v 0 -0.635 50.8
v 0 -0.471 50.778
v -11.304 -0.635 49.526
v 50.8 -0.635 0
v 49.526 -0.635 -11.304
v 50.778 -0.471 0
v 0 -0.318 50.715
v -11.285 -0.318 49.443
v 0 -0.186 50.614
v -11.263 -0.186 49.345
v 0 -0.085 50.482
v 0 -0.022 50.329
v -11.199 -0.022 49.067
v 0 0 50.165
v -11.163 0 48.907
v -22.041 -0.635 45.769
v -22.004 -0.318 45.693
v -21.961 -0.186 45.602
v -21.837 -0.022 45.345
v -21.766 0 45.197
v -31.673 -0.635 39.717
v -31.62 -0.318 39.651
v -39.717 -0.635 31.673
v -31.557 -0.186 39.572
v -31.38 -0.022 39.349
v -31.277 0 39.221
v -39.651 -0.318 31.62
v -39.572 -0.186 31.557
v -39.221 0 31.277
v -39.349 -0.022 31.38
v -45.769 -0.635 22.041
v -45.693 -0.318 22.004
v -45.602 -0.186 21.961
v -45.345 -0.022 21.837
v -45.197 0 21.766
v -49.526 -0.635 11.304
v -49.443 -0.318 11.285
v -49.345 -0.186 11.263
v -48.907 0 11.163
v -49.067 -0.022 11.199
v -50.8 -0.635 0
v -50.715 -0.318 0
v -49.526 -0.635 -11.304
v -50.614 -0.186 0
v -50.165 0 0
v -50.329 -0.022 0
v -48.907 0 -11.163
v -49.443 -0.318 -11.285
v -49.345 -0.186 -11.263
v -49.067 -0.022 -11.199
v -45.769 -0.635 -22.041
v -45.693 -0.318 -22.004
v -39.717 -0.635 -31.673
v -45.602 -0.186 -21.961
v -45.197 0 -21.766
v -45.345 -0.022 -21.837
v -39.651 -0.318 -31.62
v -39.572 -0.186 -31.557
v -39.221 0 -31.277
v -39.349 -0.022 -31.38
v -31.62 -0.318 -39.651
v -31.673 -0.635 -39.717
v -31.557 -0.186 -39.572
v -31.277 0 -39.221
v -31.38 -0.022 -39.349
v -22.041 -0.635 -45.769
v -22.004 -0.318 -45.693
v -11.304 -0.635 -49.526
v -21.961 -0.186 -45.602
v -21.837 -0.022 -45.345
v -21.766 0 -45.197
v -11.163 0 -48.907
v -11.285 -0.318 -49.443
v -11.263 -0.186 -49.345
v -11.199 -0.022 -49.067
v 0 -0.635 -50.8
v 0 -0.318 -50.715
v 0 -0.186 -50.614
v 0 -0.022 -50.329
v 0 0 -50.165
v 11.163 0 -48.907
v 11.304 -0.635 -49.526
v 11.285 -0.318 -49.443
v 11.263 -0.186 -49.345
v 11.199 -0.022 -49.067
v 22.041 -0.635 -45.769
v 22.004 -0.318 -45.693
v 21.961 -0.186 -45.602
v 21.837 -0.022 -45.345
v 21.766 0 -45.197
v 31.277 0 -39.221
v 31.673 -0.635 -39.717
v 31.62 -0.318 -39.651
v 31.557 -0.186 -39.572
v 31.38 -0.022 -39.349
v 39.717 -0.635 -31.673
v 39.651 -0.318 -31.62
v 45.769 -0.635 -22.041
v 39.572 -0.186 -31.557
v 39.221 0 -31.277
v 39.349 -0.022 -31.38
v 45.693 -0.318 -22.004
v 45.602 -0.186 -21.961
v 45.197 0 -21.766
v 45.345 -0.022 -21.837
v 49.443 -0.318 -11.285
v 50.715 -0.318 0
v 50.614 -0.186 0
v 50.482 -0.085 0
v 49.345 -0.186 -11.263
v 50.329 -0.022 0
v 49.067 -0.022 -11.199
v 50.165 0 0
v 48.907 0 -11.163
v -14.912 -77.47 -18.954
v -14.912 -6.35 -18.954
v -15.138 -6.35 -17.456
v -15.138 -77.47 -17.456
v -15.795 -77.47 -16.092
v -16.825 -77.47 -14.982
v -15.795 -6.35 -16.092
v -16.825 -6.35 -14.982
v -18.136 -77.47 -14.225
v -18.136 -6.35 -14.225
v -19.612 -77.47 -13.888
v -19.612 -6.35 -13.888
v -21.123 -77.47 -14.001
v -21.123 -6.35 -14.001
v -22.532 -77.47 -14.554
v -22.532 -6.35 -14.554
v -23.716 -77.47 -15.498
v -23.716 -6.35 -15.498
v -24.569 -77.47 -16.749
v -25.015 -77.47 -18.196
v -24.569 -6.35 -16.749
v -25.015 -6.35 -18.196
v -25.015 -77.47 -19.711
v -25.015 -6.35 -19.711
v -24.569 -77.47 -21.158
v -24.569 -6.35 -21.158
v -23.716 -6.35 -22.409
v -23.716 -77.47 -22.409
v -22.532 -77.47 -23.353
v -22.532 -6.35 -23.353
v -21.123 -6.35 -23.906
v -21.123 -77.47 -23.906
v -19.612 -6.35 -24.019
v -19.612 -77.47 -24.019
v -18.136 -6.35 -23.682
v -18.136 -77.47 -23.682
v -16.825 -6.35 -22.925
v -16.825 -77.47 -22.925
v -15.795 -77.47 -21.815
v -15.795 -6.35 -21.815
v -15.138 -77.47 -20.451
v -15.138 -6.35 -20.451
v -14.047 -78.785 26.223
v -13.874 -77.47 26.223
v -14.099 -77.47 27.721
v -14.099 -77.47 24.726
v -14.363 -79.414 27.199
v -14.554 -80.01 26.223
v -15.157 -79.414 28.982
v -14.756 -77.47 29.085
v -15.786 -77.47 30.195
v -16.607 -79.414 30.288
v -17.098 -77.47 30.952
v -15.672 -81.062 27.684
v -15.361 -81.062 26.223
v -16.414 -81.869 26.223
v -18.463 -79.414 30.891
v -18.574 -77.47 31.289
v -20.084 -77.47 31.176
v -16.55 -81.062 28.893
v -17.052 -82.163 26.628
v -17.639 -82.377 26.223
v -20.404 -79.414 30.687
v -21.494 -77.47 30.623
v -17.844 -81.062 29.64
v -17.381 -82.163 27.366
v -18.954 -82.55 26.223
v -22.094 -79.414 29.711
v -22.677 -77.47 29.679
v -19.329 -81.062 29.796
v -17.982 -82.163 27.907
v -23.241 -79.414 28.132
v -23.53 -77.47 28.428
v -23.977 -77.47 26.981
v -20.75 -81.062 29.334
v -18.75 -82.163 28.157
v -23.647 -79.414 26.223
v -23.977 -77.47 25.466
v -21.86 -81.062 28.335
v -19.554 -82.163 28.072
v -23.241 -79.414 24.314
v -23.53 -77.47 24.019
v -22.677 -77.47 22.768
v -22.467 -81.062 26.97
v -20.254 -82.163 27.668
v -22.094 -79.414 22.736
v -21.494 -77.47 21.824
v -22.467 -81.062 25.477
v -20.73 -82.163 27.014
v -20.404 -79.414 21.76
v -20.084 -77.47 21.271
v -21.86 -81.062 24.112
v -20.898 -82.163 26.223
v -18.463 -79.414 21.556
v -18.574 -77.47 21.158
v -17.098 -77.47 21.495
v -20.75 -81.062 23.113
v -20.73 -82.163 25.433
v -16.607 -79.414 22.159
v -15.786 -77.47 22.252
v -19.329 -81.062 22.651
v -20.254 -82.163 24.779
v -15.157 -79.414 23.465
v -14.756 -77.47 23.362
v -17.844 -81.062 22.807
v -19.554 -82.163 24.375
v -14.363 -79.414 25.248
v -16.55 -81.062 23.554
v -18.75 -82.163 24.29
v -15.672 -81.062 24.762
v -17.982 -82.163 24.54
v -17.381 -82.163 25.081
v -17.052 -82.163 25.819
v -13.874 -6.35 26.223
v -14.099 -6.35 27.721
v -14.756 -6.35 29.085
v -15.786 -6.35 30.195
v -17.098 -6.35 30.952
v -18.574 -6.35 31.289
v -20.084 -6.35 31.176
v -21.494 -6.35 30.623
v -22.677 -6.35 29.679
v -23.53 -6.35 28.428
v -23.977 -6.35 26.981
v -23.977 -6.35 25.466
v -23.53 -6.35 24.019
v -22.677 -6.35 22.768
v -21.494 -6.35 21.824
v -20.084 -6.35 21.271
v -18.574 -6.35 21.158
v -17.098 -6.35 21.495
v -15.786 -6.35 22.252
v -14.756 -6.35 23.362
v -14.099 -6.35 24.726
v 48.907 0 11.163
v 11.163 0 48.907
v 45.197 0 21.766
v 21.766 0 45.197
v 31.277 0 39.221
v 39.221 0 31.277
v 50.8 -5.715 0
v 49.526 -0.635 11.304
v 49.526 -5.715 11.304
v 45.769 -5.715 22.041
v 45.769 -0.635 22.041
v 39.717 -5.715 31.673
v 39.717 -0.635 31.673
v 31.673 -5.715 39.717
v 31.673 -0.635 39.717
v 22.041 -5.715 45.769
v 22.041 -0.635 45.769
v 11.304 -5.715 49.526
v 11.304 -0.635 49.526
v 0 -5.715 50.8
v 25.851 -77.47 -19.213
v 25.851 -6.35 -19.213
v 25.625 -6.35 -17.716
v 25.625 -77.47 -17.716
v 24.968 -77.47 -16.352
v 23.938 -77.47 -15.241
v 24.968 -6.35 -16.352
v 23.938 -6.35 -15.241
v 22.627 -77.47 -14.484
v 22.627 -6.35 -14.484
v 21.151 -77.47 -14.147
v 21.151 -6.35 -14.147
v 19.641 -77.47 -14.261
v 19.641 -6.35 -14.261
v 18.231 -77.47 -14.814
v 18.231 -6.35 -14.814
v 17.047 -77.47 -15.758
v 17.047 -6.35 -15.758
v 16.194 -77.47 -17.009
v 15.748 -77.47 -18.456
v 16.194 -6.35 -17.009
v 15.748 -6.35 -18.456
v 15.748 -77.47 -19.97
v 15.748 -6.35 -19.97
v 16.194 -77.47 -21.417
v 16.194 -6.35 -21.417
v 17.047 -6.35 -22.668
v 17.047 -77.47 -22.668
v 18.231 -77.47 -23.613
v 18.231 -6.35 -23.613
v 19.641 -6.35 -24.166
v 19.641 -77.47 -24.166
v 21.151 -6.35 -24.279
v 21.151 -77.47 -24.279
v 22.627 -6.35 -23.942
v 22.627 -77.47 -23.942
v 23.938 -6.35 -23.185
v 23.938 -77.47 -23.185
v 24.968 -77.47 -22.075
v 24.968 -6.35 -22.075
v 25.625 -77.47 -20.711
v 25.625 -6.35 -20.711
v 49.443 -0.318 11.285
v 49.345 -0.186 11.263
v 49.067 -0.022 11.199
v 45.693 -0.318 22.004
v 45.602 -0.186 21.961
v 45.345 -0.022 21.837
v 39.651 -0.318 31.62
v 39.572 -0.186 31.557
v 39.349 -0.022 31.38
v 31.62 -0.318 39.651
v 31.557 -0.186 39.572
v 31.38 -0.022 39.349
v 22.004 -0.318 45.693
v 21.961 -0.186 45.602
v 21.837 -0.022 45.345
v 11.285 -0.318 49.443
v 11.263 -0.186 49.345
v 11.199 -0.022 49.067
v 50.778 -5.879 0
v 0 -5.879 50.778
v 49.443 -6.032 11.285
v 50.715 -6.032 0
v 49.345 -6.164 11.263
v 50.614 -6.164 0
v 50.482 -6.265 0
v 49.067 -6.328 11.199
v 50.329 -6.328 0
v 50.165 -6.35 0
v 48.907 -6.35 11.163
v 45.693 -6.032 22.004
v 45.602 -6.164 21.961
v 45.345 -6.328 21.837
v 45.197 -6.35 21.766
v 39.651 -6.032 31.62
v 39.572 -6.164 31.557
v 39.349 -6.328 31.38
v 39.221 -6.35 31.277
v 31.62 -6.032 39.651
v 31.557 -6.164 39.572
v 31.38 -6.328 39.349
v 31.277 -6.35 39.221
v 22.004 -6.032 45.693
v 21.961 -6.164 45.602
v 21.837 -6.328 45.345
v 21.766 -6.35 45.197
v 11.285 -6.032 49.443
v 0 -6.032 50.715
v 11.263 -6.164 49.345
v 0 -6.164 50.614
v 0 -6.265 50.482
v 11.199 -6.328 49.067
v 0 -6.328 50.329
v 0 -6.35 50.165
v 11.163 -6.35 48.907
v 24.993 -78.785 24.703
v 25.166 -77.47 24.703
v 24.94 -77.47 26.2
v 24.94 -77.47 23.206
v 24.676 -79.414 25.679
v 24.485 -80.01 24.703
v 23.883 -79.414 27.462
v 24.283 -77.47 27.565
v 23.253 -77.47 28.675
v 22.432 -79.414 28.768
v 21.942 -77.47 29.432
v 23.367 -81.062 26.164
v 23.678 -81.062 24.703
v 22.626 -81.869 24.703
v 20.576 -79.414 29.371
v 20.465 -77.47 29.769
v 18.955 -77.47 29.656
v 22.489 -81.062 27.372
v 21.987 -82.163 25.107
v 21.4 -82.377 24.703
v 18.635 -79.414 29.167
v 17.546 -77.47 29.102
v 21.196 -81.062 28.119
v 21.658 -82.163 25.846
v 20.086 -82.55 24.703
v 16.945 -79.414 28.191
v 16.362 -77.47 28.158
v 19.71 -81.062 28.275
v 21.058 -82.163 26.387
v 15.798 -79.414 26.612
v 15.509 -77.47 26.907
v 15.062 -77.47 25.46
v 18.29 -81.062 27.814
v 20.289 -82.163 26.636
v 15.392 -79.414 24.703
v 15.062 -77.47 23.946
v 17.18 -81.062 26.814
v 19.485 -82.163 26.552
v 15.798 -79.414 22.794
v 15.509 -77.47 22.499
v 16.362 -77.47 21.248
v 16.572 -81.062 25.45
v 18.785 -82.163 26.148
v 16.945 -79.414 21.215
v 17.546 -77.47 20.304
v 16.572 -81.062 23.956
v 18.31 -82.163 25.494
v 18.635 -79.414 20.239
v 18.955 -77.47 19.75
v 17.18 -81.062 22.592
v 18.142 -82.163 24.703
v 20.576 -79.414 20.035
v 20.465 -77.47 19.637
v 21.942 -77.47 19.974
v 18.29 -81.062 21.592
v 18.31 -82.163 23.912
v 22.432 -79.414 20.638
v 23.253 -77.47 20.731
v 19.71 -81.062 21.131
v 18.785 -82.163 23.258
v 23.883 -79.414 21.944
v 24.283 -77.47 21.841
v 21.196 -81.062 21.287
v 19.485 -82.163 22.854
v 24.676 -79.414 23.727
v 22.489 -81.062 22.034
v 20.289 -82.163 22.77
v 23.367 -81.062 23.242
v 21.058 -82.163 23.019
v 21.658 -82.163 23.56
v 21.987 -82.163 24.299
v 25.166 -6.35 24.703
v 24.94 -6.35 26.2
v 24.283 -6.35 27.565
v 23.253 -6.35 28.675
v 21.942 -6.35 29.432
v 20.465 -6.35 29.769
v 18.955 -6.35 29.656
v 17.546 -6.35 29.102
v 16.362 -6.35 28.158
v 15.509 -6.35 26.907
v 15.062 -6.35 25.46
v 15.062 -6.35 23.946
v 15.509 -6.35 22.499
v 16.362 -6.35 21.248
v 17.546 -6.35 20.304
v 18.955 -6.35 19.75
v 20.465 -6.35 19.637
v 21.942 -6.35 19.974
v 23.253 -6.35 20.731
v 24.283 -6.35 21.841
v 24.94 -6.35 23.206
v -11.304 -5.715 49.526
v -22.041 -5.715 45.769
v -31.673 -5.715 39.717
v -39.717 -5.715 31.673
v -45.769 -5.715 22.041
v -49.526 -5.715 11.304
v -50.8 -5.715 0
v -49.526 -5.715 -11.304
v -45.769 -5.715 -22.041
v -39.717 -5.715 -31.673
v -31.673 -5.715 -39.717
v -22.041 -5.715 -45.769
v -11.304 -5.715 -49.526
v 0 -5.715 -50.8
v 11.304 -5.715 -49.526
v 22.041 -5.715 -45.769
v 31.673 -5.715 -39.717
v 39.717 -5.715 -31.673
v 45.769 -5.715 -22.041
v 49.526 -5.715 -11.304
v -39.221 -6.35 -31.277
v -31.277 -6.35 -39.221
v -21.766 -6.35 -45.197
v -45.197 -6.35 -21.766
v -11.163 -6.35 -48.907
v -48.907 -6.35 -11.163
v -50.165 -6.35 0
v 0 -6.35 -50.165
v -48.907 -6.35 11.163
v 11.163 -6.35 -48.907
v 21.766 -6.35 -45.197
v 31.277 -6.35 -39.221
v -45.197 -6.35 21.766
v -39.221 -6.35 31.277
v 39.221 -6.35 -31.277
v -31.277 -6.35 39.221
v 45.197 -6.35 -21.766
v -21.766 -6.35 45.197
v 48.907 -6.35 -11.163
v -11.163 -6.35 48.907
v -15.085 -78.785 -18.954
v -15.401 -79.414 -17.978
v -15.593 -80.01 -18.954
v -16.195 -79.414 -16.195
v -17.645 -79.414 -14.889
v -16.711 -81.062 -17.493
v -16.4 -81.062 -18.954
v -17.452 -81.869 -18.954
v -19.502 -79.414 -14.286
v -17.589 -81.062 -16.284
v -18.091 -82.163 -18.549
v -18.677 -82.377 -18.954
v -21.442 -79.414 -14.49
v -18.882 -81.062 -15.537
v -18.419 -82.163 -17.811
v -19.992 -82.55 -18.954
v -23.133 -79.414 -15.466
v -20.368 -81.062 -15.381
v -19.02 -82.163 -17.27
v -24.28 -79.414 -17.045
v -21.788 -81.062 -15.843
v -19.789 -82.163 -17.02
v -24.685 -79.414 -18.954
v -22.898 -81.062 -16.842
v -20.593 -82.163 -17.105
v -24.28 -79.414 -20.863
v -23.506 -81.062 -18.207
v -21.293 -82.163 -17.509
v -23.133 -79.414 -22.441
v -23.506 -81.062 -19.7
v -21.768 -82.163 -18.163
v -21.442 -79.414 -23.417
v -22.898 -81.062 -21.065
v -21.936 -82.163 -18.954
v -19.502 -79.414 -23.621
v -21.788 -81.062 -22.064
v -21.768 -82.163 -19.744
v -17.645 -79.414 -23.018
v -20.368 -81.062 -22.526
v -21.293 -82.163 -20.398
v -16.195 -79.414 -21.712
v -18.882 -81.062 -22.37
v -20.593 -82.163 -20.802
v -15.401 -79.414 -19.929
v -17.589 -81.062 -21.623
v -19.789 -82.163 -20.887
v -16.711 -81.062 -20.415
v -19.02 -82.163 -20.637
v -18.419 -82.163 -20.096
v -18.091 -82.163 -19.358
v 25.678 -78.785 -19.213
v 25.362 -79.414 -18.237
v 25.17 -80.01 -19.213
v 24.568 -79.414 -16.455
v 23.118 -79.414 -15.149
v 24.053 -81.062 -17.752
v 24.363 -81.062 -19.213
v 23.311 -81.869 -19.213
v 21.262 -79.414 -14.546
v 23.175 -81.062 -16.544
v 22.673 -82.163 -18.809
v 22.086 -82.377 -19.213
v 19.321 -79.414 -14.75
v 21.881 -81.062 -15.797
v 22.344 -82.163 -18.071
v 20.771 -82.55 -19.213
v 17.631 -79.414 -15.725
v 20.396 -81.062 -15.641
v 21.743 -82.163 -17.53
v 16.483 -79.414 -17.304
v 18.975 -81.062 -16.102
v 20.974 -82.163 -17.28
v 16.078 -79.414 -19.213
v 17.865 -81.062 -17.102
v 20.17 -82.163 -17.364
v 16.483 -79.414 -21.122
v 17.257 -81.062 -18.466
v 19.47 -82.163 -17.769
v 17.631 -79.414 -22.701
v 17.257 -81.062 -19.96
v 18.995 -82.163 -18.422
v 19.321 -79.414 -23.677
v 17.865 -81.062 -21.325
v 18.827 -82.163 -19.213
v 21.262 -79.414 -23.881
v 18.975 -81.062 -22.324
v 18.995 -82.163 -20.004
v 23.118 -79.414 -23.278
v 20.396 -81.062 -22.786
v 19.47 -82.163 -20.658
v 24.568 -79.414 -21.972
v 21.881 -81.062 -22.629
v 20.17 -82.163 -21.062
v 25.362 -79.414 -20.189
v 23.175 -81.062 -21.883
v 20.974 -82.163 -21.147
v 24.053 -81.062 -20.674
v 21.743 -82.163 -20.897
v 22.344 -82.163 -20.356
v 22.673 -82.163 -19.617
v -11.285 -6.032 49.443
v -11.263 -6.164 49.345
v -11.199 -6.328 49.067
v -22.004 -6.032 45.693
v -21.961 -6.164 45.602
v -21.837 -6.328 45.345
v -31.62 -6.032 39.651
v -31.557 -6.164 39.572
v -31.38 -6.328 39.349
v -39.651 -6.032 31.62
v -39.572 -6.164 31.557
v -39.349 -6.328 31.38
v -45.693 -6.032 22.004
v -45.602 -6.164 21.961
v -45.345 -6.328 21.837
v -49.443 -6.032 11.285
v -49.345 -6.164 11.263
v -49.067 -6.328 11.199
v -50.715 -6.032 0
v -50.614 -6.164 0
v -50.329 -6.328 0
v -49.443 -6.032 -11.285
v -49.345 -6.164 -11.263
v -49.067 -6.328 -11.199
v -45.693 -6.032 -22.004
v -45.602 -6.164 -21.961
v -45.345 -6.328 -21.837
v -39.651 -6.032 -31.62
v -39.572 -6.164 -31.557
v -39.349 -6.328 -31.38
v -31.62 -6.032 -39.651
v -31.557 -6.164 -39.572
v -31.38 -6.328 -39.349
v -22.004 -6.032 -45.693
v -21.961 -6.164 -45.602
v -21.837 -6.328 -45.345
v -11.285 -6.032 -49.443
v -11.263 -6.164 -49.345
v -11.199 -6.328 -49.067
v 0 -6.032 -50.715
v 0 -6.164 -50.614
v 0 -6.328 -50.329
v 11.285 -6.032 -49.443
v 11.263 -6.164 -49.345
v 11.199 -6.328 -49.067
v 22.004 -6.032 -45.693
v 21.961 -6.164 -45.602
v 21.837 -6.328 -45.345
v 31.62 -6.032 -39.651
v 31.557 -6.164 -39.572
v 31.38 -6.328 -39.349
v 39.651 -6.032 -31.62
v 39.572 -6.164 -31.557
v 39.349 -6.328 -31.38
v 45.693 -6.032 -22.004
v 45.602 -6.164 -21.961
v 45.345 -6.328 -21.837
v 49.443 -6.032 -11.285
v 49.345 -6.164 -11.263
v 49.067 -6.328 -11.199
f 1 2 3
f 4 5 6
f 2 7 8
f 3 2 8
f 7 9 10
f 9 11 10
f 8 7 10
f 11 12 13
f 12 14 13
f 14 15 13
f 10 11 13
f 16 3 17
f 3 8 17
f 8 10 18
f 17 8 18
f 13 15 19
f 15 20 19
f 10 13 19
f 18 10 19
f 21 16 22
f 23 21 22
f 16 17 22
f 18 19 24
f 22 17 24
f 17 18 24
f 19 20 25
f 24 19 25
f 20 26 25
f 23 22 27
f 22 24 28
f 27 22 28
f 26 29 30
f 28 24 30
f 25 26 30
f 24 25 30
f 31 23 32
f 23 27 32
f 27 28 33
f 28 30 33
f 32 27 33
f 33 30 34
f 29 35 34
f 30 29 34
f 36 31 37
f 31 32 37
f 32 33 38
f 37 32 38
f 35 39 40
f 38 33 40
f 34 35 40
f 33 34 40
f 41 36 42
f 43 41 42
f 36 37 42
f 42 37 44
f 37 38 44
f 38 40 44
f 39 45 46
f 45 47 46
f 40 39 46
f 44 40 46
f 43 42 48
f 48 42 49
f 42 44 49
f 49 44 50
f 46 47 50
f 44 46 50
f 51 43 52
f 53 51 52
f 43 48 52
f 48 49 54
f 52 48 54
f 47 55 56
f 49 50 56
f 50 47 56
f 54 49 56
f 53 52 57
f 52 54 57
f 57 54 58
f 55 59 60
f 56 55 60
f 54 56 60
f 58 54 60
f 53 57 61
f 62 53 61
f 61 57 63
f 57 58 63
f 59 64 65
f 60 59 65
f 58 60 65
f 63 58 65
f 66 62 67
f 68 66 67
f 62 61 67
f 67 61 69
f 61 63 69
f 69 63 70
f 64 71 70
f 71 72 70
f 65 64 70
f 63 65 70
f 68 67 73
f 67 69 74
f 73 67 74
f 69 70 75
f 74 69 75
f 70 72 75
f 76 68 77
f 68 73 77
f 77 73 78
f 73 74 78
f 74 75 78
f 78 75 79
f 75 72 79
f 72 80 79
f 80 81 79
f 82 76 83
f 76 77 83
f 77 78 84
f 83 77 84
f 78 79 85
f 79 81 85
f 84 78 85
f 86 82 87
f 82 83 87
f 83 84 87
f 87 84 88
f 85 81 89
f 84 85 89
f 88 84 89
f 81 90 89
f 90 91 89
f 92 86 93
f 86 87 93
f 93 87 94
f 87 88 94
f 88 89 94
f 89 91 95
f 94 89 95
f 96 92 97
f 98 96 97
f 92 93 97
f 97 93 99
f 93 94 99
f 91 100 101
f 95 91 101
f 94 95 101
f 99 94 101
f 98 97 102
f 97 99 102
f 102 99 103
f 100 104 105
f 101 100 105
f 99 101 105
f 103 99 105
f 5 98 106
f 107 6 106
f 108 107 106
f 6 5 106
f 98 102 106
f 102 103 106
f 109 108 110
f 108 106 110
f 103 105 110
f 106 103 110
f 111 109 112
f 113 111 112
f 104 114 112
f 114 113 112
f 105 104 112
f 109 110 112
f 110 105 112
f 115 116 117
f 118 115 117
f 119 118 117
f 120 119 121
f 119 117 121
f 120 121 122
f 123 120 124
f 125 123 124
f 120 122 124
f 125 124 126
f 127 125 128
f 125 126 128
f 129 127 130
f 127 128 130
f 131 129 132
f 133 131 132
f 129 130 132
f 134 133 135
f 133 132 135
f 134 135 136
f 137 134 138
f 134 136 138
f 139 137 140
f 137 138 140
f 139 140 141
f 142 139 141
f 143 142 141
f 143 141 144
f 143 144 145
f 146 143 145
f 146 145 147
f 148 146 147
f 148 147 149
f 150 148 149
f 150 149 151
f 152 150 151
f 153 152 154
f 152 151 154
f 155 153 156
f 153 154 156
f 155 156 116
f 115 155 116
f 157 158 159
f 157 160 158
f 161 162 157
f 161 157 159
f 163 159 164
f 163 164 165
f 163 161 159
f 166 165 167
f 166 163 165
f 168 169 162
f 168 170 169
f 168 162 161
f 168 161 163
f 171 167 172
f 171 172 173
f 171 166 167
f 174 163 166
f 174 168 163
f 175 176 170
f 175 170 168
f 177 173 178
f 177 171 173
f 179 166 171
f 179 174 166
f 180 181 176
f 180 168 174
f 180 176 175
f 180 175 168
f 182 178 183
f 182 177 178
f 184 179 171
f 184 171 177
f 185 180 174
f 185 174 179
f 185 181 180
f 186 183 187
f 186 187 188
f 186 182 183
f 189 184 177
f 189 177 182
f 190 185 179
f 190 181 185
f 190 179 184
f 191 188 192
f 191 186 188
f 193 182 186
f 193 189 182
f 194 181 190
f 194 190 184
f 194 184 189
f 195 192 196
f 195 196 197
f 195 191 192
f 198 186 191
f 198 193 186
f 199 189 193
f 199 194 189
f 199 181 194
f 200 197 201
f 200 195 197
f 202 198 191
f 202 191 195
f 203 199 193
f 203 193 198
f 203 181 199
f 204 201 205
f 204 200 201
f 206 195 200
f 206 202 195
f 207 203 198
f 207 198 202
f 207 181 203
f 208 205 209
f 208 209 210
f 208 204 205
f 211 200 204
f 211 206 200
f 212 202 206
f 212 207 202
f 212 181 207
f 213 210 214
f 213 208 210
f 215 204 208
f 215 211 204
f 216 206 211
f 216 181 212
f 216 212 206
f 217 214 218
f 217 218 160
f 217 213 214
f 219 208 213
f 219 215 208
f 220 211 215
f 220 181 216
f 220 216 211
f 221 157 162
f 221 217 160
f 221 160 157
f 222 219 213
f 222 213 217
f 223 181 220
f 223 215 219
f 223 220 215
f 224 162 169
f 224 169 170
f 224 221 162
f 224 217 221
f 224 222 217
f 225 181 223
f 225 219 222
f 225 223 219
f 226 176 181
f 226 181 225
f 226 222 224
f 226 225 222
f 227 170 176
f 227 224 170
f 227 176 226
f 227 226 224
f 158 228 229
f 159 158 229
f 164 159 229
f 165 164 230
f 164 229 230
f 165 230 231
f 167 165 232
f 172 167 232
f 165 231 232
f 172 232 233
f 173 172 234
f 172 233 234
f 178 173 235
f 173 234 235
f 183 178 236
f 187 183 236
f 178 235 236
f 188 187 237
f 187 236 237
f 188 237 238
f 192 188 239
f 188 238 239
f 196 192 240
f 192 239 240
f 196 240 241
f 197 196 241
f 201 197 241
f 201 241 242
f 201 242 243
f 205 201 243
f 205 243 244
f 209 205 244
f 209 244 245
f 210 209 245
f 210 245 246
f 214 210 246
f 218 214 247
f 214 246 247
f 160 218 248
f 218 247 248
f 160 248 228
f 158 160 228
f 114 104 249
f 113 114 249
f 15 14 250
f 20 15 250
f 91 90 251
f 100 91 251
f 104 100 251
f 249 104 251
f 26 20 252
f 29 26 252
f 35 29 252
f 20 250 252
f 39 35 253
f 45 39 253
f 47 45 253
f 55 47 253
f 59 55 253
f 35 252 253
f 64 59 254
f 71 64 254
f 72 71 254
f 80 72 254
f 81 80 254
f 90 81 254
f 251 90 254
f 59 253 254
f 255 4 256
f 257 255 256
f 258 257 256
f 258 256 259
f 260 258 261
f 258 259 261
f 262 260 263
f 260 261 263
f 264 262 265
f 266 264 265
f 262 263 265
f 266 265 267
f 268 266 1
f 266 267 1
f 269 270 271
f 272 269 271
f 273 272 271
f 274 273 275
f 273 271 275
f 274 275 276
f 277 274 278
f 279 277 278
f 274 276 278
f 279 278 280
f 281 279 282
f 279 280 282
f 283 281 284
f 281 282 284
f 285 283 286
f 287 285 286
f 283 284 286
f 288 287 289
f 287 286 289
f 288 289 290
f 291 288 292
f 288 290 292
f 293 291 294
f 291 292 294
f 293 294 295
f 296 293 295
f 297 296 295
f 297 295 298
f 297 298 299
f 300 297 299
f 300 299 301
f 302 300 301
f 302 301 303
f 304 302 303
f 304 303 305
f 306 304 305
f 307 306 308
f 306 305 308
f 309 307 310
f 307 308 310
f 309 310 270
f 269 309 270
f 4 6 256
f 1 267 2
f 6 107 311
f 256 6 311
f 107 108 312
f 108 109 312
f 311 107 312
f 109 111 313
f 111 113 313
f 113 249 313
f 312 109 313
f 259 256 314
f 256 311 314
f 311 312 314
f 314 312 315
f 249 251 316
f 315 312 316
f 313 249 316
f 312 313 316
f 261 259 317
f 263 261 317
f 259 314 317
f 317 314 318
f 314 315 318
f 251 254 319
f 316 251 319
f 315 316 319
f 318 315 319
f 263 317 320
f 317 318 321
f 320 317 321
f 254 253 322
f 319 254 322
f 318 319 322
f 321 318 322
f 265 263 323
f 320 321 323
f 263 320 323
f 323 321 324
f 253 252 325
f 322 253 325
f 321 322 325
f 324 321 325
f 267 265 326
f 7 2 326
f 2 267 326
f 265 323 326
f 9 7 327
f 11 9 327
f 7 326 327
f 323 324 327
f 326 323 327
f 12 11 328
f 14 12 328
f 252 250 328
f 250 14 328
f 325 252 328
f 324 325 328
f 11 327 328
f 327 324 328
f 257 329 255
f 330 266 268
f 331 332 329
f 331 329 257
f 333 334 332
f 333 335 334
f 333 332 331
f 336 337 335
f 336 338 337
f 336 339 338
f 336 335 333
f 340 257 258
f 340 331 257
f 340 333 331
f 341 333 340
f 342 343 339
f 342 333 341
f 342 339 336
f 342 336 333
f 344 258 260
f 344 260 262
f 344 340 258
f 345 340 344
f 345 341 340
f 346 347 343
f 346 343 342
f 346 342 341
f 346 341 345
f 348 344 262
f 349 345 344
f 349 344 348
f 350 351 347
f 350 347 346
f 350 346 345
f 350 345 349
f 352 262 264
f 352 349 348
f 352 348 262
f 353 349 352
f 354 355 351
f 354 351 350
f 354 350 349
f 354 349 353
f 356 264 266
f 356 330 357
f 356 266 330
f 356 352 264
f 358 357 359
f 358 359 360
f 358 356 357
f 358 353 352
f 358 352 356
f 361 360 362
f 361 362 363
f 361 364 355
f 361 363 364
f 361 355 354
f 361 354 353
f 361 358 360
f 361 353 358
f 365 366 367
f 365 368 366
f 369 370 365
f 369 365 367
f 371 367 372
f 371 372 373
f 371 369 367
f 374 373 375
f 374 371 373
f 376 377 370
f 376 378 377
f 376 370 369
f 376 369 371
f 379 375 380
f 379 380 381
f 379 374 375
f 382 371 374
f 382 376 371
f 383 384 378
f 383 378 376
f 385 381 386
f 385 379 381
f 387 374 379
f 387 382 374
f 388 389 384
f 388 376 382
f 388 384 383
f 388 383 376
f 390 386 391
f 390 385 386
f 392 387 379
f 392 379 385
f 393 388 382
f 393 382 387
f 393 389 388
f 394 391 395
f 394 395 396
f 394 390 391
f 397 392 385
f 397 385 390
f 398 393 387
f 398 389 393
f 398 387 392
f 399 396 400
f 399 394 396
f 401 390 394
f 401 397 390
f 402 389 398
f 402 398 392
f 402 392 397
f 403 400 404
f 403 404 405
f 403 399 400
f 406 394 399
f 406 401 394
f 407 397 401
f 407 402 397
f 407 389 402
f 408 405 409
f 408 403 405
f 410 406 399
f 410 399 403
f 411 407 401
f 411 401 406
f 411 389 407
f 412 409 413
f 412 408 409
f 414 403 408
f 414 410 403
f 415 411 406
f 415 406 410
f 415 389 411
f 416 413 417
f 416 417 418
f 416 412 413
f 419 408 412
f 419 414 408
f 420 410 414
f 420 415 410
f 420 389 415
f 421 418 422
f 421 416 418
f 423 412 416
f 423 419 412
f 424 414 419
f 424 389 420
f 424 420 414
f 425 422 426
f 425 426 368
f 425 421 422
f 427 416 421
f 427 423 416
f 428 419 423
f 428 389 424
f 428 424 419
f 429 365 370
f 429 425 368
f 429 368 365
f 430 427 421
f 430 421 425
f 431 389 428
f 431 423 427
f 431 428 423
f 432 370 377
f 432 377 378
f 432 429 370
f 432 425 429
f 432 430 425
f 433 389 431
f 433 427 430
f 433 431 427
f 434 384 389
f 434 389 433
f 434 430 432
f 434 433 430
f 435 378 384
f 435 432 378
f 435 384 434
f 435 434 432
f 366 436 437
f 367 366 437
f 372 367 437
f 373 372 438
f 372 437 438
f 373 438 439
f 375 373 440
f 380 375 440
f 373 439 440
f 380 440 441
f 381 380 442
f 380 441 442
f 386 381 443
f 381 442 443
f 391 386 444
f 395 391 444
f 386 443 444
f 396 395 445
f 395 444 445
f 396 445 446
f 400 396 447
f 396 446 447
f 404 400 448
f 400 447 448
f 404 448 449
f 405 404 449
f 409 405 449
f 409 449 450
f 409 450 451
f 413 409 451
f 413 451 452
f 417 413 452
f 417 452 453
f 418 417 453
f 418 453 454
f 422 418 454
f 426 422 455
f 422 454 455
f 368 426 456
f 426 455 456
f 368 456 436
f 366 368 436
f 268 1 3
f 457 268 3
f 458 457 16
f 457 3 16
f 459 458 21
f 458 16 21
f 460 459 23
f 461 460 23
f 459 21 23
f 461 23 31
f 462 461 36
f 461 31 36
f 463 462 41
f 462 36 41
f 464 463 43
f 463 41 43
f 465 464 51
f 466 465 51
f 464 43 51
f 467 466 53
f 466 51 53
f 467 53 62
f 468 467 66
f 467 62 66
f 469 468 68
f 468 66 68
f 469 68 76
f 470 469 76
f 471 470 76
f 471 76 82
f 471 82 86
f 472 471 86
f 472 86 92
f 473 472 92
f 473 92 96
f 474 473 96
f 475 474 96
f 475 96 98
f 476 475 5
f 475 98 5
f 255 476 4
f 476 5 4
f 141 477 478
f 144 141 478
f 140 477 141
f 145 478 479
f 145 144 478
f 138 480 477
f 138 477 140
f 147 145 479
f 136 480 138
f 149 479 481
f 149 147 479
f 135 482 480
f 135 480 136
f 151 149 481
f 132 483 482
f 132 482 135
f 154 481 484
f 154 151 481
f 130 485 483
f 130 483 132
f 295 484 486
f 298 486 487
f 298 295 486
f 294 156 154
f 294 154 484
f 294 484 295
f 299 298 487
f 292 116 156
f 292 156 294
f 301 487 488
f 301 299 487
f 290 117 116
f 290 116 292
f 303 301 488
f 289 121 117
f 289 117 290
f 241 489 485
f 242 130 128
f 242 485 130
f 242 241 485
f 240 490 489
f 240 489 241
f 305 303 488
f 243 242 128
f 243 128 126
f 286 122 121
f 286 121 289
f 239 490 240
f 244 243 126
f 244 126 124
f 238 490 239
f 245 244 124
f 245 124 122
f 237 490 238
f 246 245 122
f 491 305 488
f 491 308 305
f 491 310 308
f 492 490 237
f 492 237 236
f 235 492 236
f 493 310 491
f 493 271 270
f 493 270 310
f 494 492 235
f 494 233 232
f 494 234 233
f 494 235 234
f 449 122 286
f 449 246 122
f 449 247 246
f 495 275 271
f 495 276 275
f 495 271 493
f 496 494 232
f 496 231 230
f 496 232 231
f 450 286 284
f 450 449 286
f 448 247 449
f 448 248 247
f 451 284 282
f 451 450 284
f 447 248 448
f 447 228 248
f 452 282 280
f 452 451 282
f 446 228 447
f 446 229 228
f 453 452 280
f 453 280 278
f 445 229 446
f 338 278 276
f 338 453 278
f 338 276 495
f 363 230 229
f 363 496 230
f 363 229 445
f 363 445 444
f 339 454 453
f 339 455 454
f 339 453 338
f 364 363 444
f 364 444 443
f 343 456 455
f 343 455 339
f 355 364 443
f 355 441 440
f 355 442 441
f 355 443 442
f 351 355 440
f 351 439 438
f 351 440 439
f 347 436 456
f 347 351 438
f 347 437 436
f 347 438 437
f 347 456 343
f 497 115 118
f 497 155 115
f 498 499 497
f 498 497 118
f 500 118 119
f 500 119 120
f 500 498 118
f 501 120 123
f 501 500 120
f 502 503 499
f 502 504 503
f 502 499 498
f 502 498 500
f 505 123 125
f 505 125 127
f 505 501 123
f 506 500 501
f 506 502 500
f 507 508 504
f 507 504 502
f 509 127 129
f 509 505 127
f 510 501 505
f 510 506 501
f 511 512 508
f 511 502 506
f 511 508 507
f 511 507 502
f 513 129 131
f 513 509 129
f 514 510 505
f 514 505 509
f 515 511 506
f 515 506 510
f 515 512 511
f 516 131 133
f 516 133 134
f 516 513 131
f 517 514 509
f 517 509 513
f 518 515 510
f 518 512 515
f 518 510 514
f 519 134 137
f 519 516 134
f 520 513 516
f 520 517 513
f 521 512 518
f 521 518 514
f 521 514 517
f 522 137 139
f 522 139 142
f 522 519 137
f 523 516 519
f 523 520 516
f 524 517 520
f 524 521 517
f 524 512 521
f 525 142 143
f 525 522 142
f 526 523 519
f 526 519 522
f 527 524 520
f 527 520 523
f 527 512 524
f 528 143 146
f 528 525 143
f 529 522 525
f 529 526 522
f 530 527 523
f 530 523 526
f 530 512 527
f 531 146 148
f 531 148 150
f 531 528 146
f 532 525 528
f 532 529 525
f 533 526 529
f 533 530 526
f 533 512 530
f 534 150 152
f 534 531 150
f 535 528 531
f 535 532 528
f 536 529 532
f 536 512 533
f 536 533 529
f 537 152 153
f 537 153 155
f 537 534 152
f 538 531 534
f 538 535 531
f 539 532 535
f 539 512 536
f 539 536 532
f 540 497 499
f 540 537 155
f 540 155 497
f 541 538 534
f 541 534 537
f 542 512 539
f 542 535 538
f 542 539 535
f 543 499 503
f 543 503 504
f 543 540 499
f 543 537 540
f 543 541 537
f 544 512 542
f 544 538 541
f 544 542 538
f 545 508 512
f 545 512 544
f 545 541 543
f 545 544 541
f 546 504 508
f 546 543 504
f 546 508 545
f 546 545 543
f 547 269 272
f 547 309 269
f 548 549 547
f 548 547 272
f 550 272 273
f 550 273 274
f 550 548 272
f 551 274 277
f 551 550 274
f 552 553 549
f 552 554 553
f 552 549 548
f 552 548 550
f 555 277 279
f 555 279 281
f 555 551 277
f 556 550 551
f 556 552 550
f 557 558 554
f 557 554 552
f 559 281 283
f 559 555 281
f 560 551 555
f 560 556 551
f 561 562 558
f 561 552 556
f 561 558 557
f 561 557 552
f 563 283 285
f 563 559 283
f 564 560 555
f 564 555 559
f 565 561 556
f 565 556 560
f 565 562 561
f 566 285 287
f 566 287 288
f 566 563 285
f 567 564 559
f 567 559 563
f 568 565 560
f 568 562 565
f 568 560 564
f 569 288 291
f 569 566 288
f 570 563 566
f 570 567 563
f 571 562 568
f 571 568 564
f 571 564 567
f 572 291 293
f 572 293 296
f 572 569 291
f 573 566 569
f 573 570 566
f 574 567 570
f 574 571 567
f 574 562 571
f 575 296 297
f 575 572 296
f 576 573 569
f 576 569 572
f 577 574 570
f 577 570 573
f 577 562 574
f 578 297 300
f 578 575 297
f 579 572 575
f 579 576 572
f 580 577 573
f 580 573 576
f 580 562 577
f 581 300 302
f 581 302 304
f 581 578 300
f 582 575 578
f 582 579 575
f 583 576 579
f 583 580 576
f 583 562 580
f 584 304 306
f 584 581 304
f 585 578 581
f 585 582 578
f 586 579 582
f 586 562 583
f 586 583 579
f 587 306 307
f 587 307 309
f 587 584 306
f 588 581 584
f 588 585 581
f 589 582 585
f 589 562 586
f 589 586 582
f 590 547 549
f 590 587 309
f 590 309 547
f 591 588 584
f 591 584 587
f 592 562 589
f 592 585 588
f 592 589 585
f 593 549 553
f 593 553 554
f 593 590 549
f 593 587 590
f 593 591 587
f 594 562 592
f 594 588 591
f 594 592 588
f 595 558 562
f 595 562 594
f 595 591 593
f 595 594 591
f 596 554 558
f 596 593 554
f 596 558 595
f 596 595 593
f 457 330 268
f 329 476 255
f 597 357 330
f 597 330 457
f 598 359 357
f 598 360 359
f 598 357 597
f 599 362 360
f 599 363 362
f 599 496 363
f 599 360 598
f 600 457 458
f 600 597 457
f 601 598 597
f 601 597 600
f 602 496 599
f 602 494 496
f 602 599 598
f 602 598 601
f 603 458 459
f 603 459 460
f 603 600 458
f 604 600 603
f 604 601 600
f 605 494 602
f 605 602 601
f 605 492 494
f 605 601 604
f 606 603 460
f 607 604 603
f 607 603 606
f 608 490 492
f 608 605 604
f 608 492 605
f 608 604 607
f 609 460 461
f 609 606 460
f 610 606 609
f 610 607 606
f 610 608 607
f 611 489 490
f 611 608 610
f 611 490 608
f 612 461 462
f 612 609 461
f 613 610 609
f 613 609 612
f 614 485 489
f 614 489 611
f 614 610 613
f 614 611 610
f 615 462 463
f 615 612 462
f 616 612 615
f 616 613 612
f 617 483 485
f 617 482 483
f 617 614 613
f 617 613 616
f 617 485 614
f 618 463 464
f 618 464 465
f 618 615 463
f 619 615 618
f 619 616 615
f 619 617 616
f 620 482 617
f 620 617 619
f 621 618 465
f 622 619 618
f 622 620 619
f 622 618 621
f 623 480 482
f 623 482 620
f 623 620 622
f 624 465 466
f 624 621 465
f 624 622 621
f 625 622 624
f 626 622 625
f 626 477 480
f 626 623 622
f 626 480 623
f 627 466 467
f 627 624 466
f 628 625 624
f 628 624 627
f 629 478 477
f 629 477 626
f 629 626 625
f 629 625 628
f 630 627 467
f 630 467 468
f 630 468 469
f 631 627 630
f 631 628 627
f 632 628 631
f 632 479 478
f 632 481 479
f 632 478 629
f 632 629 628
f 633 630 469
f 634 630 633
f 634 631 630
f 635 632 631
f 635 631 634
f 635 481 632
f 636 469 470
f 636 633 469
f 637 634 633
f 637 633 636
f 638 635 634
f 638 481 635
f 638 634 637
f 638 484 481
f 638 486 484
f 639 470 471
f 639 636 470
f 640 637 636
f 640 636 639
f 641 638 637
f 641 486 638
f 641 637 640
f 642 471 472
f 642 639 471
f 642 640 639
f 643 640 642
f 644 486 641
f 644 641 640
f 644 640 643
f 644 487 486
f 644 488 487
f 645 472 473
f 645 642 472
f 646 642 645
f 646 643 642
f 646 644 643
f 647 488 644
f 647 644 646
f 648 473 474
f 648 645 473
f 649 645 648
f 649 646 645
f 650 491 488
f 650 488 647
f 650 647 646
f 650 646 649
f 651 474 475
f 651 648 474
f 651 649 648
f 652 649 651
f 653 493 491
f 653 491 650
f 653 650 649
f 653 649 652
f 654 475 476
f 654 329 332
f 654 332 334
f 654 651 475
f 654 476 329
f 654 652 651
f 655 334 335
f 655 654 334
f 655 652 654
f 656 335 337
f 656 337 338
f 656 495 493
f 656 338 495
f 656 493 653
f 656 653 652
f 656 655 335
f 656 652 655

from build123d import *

# Parameters (mm, degrees)
F0_R     = 6.35
F1_DEPTH = 6.35
F2_R     = 0.635
F3_R     = 5.08
F4_DEPTH = 76.2
F5_DEPTH = 76.2
F6_R     = 5.08


with BuildPart() as f1:
    # F0 (on Front) → F1 (new body)
    with BuildSketch(Plane.XZ):
        with BuildLine():
            ThreePointArc((0, 50.8), (-35.921024, -35.921024), (50.8, 0))
            Line((50.8, 0), (0, 0))
            Line((0, 0), (0, 50.8))
        make_face()
        with BuildLine():
            Line((0, 0), (50.8, 0))
            ThreePointArc((50.8, 0), (35.921024, 35.921024), (0, 50.8))
            Line((0, 50.8), (0, 0))
        make_face()
        with Locations((19.05, 25.4)):
            Circle(F0_R, mode=Mode.SUBTRACT)
        with Locations((19.05, 25.4)):
            Circle(F0_R)
    extrude(amount=F1_DEPTH)

    # F2
    f2_edges = [f1.edges().sort_by_distance(p)[0] for p in [
        (-50.8, -6.35, 0),
        (-50.8, 0, 0),
    ]]
    fillet(f2_edges, radius=F2_R)

    # F3 (on face) → F4 (join)
    with BuildSketch(Plane.XZ.offset(6.35)):
        with Locations((20.085614, 24.702994)):
            Circle(F3_R)
    extrude(amount=F4_DEPTH)

    # F3 (on face) → F5 (join)
    with BuildSketch(Plane.XZ.offset(6.35)):
        with Locations((20.085614, 24.702994)):
            Circle(F3_R)
        with Locations((20.771028, -19.2132)):
            Circle(F3_R)
        with Locations((-19.992113, -18.953562)):
            Circle(F3_R)
        with Locations((-18.953562, 26.223423)):
            Circle(F3_R)
    extrude(amount=F5_DEPTH)

    # F6
    f6_edges = [f1.edges().sort_by_distance(p)[0] for p in [
        (-24.033562, -82.55, 26.223423),
        (15.005614, -82.55, 24.702994),
        (-25.072113, -82.55, -18.953562),
        (15.691028, -82.55, -19.2132),
    ]]
    fillet(f6_edges, radius=F6_R)


solid = f1.part
